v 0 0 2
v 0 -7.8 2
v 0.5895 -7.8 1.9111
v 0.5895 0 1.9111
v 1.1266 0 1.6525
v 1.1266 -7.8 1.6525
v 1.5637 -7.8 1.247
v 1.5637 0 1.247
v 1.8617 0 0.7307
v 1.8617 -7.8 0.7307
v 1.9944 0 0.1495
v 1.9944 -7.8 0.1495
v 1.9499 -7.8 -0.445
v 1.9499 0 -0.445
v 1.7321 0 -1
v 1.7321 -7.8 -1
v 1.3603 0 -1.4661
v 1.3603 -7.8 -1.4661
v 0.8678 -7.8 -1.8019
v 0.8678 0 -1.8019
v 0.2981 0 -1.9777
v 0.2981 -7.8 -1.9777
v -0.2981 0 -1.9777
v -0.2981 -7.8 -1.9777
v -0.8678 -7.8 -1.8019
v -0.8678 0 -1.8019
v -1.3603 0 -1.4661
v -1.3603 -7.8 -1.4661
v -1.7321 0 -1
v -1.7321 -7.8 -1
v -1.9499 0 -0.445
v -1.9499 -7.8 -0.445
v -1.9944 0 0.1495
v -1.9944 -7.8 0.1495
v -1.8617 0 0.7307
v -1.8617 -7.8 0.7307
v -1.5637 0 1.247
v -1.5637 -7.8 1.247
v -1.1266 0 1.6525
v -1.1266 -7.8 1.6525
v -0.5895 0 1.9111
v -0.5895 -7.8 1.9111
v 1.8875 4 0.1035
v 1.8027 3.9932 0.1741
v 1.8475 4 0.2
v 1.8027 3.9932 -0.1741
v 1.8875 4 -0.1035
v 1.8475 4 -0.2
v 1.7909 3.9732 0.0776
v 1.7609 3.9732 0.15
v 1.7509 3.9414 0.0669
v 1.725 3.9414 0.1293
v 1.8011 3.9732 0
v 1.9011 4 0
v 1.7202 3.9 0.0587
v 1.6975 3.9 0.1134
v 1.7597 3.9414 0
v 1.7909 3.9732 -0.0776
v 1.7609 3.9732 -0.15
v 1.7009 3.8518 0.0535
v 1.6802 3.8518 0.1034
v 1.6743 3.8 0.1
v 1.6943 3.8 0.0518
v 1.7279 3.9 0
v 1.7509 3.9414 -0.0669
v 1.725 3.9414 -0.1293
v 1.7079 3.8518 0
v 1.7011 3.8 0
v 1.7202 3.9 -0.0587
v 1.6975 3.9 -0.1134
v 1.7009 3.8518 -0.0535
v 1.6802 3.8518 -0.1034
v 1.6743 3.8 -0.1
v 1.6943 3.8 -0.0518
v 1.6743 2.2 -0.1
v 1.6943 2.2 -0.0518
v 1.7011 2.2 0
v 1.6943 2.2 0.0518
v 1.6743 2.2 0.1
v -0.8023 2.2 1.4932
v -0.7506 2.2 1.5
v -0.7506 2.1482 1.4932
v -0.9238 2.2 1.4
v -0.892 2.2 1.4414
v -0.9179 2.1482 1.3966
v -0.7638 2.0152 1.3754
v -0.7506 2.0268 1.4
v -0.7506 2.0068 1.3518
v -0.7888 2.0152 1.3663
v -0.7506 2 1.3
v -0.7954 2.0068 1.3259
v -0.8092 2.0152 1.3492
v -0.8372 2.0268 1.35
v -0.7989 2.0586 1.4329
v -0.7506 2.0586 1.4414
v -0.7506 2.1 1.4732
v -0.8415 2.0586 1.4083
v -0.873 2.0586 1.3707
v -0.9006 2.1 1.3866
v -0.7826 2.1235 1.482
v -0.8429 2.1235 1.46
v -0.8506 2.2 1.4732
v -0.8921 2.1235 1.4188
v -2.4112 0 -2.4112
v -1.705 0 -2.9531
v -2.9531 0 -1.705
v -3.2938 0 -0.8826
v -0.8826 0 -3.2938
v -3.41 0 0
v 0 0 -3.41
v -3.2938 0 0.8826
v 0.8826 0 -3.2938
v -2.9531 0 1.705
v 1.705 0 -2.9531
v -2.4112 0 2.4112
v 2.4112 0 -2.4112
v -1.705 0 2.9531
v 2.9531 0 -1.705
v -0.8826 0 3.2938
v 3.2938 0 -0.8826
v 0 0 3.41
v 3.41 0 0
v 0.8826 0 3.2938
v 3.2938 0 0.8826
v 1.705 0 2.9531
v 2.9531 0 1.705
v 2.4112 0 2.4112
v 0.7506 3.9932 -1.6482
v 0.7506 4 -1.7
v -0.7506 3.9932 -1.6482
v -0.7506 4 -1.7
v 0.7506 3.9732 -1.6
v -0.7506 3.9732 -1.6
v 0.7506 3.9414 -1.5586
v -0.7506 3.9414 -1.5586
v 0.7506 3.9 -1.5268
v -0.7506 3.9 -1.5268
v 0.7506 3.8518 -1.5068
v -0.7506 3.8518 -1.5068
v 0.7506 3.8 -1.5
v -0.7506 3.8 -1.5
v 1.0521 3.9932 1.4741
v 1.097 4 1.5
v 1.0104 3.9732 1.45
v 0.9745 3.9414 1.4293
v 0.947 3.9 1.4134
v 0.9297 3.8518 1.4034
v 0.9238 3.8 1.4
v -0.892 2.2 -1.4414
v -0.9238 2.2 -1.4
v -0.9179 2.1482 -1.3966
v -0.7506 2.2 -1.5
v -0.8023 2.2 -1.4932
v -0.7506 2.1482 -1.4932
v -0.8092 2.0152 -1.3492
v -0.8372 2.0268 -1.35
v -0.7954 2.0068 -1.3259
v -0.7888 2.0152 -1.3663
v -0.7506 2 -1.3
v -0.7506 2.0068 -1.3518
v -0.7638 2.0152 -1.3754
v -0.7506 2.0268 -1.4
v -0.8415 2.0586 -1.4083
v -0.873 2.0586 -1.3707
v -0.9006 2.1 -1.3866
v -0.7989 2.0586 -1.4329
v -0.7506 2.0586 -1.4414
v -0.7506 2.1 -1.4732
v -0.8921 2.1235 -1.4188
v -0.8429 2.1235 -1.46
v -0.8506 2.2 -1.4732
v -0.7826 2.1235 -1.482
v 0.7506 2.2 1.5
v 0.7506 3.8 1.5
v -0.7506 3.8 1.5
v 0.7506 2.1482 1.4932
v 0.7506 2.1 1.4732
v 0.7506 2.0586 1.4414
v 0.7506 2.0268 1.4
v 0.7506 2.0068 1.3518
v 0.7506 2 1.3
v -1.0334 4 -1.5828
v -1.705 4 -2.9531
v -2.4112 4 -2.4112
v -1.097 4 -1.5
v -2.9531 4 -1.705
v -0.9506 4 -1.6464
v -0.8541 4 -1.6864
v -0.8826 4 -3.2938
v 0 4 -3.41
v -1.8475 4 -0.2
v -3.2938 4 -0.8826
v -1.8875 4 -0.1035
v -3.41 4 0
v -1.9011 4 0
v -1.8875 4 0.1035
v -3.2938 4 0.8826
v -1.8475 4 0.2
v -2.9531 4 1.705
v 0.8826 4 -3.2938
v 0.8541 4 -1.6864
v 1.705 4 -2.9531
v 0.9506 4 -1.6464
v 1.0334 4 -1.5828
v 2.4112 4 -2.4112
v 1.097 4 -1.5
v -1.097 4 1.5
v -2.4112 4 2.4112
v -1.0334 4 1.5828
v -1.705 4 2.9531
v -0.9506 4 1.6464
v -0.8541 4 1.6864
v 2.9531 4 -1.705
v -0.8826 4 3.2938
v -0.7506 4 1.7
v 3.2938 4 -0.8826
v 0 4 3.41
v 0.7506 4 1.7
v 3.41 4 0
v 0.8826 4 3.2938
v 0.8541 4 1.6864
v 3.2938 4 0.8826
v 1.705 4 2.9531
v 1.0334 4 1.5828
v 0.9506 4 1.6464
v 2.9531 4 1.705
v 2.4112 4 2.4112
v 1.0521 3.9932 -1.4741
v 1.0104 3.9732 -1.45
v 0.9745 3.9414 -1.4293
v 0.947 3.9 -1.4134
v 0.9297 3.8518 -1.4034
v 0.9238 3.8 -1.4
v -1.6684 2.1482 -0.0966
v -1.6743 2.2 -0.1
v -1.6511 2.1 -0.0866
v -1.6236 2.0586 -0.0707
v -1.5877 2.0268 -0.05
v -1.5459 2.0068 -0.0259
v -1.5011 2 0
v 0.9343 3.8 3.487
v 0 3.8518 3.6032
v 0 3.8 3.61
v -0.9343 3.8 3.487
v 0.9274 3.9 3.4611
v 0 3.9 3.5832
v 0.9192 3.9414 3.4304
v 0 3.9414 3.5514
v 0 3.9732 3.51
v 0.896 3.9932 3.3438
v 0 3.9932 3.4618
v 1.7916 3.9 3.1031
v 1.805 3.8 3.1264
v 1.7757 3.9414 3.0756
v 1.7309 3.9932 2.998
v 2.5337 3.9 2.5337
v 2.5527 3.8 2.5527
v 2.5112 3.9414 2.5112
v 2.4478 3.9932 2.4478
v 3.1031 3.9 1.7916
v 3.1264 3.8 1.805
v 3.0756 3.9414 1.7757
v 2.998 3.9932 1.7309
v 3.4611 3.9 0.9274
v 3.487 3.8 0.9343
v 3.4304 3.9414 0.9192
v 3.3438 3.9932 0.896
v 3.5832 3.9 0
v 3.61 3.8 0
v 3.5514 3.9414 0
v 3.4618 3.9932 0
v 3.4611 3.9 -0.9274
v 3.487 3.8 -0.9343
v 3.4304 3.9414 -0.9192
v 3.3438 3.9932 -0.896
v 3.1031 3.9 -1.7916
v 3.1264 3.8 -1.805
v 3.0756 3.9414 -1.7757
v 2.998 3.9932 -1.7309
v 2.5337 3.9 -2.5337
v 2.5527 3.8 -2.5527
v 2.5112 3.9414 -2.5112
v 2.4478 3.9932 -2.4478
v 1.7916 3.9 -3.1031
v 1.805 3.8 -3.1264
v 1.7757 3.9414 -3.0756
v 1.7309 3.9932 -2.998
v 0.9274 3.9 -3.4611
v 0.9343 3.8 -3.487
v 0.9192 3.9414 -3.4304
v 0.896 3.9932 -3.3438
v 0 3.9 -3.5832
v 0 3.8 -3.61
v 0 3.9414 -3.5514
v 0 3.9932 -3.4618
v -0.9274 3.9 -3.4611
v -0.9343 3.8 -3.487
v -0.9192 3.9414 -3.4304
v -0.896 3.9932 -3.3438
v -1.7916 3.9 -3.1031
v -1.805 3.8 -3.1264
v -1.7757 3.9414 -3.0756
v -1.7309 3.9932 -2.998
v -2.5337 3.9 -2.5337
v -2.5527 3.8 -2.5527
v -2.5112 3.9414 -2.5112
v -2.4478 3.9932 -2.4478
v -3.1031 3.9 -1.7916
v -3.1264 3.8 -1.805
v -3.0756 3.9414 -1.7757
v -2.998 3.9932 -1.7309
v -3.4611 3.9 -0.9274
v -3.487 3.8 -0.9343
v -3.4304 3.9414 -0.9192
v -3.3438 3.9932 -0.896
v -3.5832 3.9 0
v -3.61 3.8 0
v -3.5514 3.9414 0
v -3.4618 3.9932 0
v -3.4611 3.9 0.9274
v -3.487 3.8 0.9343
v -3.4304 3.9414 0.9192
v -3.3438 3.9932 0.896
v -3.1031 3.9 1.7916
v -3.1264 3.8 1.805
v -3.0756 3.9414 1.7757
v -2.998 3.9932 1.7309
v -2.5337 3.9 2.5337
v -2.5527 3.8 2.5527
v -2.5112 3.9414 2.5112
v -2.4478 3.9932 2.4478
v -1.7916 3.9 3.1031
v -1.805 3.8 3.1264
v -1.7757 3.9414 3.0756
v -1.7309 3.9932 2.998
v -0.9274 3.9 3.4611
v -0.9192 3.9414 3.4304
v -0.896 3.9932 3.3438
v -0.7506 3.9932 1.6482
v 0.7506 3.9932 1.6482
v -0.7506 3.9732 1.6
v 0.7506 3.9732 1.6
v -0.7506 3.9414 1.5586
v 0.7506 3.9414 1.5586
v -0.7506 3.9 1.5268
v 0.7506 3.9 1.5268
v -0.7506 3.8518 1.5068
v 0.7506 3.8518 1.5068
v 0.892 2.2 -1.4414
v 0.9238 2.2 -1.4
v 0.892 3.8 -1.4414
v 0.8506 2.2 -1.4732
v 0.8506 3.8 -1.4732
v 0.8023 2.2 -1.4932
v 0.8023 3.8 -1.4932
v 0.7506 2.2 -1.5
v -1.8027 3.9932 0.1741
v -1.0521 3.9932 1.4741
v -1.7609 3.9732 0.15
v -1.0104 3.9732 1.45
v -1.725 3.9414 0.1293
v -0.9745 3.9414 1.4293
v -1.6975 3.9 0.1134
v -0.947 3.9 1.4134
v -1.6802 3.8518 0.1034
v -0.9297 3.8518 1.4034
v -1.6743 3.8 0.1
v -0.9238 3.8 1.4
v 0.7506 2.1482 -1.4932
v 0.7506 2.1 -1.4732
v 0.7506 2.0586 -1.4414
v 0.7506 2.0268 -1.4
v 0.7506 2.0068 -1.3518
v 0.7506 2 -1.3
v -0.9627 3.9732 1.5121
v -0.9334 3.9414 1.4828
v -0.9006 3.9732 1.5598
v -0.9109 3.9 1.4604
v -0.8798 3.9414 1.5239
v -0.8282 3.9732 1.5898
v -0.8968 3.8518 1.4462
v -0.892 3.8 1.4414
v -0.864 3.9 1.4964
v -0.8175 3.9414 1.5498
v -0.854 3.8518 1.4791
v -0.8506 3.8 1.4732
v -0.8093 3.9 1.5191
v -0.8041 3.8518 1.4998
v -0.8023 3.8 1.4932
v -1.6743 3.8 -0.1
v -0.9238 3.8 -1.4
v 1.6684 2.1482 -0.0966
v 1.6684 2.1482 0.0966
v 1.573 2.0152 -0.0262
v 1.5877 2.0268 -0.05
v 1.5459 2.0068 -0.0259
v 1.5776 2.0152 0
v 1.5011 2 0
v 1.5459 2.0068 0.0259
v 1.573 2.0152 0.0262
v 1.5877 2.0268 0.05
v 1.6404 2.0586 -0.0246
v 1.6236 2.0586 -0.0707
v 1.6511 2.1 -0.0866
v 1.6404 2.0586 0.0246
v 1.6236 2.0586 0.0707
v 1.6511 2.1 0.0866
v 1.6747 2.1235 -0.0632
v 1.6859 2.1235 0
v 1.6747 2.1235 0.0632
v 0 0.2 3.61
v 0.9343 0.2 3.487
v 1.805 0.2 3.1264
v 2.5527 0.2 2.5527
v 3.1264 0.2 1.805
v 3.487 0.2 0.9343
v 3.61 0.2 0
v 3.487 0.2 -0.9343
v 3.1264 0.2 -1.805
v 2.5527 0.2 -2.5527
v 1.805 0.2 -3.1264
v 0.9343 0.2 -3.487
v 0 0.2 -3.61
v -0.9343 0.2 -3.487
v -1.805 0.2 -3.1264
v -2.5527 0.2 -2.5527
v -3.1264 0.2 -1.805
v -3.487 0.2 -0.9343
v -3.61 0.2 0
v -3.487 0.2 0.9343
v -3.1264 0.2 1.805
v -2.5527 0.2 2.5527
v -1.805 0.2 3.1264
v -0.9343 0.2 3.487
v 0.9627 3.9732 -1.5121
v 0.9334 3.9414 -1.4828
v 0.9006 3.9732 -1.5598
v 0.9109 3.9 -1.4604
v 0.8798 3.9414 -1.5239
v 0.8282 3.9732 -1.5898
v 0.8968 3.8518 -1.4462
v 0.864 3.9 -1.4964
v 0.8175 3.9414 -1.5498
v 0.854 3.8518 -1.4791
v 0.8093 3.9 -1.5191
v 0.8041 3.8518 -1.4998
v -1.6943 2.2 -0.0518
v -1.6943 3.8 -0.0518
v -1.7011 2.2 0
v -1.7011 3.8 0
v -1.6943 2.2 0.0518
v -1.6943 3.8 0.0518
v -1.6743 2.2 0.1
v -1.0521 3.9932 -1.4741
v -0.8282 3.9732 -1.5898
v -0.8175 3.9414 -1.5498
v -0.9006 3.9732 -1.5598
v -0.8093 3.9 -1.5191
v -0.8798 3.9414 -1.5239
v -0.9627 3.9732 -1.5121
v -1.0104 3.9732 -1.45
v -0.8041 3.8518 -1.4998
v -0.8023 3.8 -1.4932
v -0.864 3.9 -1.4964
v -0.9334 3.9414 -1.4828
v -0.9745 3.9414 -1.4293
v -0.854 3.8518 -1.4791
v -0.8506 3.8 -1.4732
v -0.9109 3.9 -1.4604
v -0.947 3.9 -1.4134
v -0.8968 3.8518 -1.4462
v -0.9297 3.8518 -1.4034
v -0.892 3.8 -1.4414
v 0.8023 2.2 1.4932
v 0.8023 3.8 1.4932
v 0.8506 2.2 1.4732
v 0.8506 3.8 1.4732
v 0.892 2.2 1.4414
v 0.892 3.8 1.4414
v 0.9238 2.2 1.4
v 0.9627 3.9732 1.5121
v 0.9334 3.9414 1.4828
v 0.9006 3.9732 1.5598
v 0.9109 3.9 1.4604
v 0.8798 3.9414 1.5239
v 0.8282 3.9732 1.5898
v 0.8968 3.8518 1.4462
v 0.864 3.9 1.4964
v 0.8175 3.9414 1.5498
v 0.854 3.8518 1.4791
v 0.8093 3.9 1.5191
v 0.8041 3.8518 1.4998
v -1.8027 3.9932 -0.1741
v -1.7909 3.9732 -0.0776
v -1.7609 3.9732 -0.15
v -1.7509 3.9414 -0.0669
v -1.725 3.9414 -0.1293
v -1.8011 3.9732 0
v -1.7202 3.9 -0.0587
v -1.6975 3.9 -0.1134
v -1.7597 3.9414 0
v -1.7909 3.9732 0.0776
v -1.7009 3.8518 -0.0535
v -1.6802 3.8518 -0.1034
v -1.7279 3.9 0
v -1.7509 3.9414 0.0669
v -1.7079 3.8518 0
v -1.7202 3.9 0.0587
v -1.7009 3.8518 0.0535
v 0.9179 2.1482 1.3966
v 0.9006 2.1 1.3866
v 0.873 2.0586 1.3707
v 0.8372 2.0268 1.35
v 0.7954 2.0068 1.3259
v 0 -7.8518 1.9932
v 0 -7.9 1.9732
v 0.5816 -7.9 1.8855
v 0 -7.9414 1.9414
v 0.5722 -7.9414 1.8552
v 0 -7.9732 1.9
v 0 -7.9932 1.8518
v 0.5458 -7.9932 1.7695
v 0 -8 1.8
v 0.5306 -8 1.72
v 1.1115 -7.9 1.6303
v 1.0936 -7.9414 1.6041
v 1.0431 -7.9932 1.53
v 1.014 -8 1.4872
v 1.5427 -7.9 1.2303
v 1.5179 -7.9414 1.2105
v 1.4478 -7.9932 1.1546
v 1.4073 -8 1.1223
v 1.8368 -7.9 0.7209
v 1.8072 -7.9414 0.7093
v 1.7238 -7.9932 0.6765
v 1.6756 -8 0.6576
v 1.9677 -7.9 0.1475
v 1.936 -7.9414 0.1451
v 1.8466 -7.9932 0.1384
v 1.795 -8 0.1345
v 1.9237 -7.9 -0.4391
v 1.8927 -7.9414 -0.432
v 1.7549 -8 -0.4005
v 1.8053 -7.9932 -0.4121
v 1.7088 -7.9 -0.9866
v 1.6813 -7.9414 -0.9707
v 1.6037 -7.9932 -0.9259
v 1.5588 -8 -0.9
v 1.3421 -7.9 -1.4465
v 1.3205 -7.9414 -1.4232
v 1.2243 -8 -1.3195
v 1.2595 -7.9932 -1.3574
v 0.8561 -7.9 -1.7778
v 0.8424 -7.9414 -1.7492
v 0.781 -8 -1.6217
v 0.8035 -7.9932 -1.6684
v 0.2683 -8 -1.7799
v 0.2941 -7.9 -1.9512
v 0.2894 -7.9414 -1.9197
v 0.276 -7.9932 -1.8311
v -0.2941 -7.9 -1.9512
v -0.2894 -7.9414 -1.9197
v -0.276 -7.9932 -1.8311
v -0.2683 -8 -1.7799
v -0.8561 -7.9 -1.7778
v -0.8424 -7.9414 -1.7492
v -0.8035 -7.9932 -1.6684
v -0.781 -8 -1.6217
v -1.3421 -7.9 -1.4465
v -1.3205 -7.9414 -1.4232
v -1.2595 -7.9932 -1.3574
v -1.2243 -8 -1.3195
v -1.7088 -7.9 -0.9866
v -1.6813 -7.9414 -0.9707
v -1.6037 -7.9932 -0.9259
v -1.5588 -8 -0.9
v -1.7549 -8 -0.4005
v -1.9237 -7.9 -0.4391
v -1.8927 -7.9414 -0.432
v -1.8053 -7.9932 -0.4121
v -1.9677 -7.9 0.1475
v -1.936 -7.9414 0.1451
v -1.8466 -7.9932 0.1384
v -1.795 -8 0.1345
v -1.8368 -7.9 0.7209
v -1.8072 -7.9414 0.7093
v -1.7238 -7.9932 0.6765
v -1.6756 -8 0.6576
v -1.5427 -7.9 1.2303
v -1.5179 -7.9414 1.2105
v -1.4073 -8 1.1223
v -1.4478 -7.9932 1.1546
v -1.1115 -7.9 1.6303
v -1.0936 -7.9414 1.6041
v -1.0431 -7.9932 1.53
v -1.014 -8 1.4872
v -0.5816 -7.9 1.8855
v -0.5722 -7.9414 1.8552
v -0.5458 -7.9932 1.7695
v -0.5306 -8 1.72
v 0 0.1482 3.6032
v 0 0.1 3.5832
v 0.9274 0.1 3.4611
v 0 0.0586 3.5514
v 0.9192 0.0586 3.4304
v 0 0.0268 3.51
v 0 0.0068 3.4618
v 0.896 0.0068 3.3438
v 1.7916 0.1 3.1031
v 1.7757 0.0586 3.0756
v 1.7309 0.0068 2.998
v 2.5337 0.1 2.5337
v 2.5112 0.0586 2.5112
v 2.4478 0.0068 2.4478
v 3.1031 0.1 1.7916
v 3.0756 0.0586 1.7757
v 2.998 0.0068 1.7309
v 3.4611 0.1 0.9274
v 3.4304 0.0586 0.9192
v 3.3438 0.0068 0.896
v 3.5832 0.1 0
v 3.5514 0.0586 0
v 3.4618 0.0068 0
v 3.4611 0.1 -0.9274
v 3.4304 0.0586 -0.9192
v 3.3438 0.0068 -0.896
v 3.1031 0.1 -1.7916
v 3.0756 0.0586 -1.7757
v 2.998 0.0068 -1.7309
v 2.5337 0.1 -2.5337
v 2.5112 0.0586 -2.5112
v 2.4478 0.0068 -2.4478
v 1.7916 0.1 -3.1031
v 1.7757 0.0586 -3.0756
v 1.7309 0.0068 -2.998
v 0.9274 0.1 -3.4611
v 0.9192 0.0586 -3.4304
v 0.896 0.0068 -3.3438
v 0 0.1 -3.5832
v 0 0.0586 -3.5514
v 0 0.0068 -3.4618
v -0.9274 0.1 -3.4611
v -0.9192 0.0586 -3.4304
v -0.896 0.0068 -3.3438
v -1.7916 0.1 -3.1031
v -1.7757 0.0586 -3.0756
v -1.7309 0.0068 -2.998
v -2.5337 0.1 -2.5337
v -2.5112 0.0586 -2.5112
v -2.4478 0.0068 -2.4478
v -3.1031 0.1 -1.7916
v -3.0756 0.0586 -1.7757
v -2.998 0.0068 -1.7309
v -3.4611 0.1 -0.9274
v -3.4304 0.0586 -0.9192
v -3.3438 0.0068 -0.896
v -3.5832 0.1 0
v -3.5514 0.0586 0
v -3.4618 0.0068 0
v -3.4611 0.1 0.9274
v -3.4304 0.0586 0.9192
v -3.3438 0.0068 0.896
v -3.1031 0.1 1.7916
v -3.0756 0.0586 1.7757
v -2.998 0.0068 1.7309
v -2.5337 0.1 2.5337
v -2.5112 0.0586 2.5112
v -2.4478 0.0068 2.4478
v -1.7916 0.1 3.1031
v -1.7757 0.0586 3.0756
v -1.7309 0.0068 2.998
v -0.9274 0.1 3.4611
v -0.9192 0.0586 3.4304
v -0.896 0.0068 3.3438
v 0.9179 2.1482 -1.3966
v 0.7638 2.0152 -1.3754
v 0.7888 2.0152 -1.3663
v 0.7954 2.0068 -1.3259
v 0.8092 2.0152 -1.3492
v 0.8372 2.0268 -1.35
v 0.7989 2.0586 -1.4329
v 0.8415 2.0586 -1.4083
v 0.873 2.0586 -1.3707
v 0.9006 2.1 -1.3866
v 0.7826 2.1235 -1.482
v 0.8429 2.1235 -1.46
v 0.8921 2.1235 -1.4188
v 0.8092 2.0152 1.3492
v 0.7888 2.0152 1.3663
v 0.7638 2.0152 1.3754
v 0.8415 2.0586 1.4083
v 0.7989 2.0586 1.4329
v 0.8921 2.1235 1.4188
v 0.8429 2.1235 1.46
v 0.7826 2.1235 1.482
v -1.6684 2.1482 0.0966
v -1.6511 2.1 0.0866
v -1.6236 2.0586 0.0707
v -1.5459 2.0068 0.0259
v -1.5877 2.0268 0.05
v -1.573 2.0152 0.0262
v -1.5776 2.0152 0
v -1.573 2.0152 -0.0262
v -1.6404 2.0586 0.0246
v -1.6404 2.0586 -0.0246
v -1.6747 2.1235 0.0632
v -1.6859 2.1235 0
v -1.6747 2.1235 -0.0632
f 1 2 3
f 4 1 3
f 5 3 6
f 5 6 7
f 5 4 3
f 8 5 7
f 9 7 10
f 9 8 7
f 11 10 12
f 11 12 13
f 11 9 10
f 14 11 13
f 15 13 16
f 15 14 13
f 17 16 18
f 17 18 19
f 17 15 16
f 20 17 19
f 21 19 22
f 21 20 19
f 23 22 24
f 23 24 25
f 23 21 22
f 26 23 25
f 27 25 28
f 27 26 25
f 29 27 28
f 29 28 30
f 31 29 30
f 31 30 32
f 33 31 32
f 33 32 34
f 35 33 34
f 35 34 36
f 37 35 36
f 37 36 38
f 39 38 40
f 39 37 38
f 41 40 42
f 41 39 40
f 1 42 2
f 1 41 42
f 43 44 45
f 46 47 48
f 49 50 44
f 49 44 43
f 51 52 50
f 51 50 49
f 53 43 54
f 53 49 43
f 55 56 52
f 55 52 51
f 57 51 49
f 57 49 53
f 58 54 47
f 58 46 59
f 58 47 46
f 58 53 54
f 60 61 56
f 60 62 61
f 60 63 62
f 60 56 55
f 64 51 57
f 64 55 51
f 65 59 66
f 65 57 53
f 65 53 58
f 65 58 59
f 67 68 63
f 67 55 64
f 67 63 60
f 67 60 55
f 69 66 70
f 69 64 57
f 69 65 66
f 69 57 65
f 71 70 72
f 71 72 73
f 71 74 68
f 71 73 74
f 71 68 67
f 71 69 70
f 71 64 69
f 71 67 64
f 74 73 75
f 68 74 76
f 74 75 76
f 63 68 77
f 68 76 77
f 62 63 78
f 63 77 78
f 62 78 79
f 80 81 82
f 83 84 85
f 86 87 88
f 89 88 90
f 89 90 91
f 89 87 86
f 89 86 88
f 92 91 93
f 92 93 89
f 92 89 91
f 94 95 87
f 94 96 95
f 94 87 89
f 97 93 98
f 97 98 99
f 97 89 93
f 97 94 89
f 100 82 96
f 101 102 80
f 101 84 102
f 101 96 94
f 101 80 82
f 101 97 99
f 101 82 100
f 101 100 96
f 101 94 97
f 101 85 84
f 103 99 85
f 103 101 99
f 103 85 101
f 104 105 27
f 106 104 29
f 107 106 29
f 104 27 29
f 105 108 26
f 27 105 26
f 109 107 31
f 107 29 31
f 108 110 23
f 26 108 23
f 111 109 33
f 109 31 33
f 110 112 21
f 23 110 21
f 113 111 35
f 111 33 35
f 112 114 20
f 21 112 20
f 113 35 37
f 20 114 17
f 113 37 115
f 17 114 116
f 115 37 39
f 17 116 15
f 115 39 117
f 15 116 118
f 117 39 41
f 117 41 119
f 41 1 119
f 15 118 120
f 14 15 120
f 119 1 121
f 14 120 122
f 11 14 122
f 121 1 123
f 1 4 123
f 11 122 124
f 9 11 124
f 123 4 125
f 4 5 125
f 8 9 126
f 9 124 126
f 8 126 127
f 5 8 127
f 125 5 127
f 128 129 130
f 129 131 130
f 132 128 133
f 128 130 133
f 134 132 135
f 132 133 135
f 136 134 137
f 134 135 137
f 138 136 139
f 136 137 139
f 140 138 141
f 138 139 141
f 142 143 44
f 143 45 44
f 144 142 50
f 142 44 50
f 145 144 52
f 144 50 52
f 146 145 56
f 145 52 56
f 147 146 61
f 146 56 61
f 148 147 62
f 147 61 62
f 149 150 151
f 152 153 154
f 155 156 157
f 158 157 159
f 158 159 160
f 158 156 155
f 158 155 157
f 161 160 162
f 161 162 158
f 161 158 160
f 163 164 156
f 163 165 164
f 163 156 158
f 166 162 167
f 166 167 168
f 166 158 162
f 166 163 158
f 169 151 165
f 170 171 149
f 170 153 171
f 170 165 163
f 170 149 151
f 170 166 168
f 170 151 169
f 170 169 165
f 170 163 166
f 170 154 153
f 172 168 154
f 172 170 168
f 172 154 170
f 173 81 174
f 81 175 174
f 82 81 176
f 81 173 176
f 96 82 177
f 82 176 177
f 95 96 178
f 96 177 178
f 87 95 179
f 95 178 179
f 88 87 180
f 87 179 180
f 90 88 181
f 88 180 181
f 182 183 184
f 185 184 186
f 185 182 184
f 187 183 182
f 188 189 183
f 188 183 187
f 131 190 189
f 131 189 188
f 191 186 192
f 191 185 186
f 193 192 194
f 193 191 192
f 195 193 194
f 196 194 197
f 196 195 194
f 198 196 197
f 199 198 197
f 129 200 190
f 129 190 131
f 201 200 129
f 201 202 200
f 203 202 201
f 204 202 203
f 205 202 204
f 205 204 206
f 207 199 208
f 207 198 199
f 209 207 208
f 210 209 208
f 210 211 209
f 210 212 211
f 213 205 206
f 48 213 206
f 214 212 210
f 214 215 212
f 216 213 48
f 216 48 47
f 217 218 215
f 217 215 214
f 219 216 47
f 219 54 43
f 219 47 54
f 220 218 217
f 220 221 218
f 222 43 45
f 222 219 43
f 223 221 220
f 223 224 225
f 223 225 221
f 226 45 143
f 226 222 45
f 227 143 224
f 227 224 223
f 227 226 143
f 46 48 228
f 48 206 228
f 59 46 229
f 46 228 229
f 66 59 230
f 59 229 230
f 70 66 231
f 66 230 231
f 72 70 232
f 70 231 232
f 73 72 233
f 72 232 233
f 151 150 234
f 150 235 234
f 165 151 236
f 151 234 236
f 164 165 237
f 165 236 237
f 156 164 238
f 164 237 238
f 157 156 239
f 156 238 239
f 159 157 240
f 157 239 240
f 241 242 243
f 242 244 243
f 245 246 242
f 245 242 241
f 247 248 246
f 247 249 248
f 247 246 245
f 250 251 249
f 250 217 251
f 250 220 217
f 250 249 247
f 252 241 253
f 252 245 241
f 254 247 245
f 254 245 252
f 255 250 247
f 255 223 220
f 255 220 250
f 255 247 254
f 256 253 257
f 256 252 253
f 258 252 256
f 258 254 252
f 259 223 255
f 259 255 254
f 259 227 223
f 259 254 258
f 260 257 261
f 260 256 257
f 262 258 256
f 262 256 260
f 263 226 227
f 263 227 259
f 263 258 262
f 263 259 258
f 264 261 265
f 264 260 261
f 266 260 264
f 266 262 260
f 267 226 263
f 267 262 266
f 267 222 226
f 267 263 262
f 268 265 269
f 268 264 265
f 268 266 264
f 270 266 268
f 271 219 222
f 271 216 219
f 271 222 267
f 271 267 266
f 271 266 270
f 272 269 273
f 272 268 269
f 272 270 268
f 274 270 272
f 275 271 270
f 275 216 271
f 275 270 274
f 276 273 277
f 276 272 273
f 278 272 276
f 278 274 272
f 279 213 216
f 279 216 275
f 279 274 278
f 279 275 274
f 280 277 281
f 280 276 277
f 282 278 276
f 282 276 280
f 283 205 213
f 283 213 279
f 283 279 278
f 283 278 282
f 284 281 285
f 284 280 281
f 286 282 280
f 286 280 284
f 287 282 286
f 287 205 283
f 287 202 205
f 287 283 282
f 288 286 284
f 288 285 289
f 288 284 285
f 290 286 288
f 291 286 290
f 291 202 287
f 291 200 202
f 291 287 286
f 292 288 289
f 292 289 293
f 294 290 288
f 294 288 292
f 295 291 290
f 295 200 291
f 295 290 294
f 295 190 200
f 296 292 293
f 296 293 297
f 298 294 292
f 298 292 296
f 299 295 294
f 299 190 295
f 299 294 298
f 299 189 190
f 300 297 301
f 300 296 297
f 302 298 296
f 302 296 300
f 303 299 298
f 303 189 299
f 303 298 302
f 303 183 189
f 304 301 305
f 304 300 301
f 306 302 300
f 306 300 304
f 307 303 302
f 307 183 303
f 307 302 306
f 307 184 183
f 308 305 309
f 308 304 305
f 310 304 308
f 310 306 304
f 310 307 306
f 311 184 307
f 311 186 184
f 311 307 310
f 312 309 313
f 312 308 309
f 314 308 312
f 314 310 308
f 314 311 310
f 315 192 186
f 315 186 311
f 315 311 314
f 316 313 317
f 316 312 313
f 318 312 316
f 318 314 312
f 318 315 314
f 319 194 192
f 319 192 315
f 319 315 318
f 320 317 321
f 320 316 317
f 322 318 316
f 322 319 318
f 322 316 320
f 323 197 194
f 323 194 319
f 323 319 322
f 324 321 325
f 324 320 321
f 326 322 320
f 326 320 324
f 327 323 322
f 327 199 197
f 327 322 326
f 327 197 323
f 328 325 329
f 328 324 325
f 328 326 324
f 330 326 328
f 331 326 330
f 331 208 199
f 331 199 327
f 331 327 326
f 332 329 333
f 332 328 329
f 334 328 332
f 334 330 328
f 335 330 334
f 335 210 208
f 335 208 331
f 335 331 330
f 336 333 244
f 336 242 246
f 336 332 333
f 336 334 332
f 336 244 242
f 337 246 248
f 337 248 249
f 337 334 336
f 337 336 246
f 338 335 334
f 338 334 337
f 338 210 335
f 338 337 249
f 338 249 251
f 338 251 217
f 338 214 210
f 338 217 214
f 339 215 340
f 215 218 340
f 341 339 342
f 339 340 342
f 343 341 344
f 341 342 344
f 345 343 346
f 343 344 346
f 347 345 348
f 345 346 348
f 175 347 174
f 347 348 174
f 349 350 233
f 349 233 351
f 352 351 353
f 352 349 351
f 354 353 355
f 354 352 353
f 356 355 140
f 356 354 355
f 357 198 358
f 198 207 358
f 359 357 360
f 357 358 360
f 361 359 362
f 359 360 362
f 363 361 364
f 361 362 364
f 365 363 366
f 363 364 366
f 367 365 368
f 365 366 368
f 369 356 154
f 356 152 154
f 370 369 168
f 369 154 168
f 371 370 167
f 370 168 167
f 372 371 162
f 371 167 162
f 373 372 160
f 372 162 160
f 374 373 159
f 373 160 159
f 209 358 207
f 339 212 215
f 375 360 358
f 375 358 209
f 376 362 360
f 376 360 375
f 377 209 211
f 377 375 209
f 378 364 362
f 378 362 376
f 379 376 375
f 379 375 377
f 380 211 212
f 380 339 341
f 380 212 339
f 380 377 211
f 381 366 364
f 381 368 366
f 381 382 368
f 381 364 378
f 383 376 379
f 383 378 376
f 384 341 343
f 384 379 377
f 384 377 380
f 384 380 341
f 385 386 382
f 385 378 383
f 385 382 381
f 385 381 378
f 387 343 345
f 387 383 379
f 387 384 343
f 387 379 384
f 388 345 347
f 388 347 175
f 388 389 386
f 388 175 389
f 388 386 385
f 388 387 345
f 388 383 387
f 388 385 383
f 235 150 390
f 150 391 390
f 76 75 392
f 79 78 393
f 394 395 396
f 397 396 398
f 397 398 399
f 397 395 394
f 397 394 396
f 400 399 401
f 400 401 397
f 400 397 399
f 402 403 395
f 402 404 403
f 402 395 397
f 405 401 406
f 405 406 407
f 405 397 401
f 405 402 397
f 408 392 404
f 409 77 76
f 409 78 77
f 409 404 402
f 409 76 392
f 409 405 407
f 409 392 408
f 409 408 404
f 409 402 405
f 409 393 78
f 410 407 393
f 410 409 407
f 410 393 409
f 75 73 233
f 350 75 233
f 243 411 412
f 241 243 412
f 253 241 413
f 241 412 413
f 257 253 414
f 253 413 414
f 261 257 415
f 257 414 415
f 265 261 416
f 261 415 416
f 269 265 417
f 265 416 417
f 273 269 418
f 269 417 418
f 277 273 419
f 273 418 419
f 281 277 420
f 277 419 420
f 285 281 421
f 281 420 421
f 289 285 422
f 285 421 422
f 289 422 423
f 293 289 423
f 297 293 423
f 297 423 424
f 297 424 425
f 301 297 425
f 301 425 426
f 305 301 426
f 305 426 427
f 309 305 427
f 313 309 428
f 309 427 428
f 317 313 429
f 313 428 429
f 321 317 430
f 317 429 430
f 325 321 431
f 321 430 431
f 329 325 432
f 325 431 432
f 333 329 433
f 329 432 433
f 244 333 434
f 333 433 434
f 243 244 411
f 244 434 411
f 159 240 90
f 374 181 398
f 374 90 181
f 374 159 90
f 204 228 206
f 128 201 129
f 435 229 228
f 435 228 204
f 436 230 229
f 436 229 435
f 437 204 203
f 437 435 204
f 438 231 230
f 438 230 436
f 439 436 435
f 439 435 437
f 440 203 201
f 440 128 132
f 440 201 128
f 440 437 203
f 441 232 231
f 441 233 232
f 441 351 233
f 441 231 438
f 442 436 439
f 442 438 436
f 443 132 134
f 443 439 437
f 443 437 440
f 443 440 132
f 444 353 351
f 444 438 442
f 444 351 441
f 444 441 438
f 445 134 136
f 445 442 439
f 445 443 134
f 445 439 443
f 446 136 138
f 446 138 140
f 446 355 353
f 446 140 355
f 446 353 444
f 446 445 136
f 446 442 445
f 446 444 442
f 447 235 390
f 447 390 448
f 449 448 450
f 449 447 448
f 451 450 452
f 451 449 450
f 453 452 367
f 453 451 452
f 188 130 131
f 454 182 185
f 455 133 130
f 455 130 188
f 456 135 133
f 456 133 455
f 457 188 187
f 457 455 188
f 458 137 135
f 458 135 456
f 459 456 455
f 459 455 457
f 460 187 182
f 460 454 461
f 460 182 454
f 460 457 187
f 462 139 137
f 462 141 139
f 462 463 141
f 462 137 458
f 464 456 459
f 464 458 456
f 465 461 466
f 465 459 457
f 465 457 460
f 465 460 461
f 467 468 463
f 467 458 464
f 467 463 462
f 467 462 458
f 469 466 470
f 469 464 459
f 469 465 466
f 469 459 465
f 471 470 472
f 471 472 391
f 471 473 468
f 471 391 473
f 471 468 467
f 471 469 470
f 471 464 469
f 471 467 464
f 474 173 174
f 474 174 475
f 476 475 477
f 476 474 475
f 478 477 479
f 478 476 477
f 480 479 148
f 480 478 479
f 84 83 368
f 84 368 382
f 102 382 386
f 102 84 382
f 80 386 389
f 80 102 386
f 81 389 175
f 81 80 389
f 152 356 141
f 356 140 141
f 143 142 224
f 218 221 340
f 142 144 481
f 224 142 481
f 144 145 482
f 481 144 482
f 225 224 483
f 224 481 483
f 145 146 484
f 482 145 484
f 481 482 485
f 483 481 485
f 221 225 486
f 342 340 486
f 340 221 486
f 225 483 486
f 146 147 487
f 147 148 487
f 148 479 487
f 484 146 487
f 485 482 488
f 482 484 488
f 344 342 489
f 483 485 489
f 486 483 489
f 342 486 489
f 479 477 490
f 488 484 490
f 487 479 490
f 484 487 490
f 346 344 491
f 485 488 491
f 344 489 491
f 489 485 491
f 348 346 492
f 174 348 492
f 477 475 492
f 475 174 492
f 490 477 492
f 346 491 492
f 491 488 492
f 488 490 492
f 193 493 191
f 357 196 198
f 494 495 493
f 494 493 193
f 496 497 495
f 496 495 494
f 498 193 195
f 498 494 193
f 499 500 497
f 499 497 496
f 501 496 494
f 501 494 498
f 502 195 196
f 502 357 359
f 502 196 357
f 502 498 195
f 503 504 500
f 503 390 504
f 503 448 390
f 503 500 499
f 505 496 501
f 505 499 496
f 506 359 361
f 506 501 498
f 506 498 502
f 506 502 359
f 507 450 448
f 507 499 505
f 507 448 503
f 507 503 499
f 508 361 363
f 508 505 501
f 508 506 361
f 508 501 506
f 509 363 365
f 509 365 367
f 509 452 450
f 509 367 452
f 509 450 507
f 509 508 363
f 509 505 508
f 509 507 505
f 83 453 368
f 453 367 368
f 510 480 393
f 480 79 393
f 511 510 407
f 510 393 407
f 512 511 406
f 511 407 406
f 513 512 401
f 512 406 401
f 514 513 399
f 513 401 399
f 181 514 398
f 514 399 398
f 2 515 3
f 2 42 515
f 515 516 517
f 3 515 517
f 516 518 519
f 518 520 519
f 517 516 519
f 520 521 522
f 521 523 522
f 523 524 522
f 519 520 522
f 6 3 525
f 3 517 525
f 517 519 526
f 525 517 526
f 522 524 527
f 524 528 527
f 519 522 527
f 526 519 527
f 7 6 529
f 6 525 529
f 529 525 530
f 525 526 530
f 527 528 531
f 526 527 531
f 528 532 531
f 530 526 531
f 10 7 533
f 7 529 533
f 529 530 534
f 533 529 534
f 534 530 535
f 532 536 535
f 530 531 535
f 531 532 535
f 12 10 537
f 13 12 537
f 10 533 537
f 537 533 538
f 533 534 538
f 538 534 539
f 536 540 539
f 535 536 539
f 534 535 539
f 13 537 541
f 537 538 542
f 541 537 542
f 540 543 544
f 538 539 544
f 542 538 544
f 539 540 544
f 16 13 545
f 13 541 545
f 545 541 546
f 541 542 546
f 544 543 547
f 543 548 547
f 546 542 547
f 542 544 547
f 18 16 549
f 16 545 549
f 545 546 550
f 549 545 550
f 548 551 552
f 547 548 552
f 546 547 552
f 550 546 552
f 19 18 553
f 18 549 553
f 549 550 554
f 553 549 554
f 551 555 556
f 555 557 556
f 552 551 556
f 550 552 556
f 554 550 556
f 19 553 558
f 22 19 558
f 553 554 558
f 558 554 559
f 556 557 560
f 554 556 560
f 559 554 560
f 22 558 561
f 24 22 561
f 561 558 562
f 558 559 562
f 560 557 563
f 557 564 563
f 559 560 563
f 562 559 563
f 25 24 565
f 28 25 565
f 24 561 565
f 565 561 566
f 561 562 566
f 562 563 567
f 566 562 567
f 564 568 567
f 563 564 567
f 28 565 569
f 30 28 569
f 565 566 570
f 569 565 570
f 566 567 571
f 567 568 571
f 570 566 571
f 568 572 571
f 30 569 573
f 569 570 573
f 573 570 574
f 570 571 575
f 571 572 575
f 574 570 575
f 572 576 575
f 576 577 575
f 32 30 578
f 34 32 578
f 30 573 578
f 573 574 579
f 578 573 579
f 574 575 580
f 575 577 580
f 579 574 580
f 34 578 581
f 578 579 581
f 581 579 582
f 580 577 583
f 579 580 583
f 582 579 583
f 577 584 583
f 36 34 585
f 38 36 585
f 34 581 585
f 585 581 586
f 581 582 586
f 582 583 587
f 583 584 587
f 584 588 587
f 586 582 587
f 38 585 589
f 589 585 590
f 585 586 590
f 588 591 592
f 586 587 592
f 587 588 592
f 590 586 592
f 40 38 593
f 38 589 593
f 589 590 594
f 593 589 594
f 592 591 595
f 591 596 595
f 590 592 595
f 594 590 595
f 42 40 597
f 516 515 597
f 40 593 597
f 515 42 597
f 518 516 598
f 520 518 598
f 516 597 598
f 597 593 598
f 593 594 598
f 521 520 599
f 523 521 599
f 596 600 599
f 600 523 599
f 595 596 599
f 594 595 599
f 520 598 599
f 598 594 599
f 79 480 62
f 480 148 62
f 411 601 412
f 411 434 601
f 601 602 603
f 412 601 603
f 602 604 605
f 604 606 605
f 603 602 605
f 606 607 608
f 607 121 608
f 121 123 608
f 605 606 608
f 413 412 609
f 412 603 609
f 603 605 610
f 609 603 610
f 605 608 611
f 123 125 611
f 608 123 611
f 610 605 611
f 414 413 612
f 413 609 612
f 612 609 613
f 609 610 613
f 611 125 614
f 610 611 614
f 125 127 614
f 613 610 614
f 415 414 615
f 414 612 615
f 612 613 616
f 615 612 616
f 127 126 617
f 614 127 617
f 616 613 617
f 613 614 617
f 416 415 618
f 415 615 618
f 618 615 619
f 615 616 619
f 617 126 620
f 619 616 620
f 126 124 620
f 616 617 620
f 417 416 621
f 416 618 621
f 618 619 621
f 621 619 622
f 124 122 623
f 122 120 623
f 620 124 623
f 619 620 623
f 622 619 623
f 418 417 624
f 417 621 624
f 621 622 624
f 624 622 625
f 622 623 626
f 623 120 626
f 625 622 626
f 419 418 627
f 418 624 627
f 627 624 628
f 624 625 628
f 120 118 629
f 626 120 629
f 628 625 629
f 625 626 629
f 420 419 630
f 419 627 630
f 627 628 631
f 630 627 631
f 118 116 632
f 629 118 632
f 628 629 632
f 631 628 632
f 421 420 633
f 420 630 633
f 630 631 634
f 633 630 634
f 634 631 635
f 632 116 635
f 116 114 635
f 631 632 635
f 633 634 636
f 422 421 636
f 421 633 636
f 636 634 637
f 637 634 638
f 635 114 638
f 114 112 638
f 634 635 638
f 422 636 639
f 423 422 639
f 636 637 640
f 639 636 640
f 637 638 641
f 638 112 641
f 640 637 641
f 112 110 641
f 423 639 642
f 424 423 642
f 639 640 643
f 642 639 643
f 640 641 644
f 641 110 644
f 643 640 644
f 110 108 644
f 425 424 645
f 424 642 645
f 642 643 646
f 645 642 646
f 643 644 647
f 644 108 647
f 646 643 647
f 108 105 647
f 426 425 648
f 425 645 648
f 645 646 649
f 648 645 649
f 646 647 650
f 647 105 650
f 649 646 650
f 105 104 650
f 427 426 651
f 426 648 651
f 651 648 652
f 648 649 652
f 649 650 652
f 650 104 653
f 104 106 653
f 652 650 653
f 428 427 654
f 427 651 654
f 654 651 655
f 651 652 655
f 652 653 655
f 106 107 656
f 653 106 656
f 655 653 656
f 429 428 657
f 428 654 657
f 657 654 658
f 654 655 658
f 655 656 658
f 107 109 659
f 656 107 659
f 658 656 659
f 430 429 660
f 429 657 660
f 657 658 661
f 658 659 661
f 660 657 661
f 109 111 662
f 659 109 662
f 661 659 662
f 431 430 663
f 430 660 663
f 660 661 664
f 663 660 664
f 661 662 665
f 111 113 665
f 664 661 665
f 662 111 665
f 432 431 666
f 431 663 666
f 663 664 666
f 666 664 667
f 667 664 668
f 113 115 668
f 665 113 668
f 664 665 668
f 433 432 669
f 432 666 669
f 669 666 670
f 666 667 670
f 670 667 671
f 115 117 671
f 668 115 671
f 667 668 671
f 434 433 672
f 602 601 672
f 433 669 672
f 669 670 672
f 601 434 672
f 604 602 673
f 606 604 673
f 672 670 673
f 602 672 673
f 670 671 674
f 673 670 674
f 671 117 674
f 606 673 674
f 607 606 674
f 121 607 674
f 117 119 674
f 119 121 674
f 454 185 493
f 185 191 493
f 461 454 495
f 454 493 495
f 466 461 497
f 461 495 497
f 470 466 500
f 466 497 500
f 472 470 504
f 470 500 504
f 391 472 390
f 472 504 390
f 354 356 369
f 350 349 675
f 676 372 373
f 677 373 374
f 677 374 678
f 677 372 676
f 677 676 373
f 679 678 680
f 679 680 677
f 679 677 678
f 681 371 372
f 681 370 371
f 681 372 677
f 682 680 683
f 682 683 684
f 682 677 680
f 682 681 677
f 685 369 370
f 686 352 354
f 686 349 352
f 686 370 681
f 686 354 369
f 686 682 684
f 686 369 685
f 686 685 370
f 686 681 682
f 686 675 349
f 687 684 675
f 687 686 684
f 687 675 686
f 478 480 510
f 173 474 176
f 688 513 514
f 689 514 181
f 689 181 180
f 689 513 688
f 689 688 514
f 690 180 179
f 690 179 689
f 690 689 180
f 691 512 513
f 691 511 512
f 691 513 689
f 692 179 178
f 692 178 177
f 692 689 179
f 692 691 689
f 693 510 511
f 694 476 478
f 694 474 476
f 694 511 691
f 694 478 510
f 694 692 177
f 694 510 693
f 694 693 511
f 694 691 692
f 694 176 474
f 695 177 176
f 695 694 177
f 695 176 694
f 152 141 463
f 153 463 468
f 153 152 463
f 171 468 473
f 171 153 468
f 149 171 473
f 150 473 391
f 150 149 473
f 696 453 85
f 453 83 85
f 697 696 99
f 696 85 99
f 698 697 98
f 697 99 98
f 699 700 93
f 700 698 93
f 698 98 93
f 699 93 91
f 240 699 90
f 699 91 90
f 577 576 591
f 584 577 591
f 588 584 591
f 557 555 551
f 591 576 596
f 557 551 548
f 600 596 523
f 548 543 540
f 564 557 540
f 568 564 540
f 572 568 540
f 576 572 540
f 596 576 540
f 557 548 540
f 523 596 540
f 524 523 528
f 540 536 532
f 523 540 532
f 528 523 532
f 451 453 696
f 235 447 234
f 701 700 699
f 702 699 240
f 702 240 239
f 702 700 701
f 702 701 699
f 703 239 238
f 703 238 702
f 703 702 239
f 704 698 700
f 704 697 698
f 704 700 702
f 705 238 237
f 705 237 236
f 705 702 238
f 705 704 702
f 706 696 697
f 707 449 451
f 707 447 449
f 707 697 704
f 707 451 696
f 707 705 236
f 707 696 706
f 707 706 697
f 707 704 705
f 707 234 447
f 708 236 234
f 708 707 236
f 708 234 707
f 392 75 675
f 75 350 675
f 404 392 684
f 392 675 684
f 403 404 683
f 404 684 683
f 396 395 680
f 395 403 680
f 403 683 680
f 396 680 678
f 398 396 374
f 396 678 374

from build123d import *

# Parameters (mm, degrees)
SKETCH1_R           = 2
BOSS_EXTRUDE1_DEPTH = 8
SKETCH2_R           = 3.61
BOSS_EXTRUDE2_DEPTH = 4
CUT_EXTRUDE1_DEPTH  = 2
FILLET1_R           = 0.2


with BuildPart() as part:
    # Sketch1 → Boss-Extrude1 (new body)
    with BuildSketch(Plane(origin=(0, 0, 0), x_dir=(1, 0, 0), z_dir=(0, 1, 0))):
        with Locations(Location((0, 0, 0), (0, 0, 270))):
            Circle(SKETCH1_R)
    extrude(amount=-BOSS_EXTRUDE1_DEPTH)

    # Sketch2 → Boss-Extrude2 (add)
    with BuildSketch(Plane(origin=(0, 0, 0), x_dir=(1, 0, 0), z_dir=(0, 1, 0))):
        with Locations(Location((0, 0, 0), (0, 0, 270))):
            Circle(SKETCH2_R)
    extrude(amount=BOSS_EXTRUDE2_DEPTH)

    # Sketch3 → Cut-Extrude1 (cut)
    with BuildSketch(Plane(origin=(0, 4, 0), x_dir=(1, 0, 0), z_dir=(0, 1, 0))):
        Polygon((1.732050808, 0), (0.866025404, 1.5), (-0.866025404, 1.5), (-1.732050808, 0), (-0.866025404, -1.5), (0.866025404, -1.5), align=None)
    extrude(amount=-CUT_EXTRUDE1_DEPTH, mode=Mode.SUBTRACT)

    # Fillet1
    fillet1_edges = [part.edges().sort_by_distance(p)[0] for p in [
        (1.299038106, 2, 0.75),
        (1.732050808, 3, 0),
        (0, 2, 1.5),
        (0.866025404, 3, 1.5),
        (-1.299038106, 2, 0.75),
        (-0.866025404, 3, 1.5),
        (-1.299038106, 2, -0.75),
        (-1.732050808, 3, 0),
        (0, 2, -1.5),
        (-0.866025404, 3, -1.5),
        (1.299038106, 2, -0.75),
        (0.866025404, 3, -1.5),
        (1.299038106, 4, 0.75),
        (1.299038106, 4, -0.75),
        (0, 4, -1.5),
        (-1.299038106, 4, -0.75),
        (-1.299038106, 4, 0.75),
        (0, 4, 1.5),
        (0, -8, -2),
        (0, 0, -3.61),
        (0, 4, -3.61),
    ]]
    fillet(fillet1_edges, radius=FILLET1_R)


solid = part.part
